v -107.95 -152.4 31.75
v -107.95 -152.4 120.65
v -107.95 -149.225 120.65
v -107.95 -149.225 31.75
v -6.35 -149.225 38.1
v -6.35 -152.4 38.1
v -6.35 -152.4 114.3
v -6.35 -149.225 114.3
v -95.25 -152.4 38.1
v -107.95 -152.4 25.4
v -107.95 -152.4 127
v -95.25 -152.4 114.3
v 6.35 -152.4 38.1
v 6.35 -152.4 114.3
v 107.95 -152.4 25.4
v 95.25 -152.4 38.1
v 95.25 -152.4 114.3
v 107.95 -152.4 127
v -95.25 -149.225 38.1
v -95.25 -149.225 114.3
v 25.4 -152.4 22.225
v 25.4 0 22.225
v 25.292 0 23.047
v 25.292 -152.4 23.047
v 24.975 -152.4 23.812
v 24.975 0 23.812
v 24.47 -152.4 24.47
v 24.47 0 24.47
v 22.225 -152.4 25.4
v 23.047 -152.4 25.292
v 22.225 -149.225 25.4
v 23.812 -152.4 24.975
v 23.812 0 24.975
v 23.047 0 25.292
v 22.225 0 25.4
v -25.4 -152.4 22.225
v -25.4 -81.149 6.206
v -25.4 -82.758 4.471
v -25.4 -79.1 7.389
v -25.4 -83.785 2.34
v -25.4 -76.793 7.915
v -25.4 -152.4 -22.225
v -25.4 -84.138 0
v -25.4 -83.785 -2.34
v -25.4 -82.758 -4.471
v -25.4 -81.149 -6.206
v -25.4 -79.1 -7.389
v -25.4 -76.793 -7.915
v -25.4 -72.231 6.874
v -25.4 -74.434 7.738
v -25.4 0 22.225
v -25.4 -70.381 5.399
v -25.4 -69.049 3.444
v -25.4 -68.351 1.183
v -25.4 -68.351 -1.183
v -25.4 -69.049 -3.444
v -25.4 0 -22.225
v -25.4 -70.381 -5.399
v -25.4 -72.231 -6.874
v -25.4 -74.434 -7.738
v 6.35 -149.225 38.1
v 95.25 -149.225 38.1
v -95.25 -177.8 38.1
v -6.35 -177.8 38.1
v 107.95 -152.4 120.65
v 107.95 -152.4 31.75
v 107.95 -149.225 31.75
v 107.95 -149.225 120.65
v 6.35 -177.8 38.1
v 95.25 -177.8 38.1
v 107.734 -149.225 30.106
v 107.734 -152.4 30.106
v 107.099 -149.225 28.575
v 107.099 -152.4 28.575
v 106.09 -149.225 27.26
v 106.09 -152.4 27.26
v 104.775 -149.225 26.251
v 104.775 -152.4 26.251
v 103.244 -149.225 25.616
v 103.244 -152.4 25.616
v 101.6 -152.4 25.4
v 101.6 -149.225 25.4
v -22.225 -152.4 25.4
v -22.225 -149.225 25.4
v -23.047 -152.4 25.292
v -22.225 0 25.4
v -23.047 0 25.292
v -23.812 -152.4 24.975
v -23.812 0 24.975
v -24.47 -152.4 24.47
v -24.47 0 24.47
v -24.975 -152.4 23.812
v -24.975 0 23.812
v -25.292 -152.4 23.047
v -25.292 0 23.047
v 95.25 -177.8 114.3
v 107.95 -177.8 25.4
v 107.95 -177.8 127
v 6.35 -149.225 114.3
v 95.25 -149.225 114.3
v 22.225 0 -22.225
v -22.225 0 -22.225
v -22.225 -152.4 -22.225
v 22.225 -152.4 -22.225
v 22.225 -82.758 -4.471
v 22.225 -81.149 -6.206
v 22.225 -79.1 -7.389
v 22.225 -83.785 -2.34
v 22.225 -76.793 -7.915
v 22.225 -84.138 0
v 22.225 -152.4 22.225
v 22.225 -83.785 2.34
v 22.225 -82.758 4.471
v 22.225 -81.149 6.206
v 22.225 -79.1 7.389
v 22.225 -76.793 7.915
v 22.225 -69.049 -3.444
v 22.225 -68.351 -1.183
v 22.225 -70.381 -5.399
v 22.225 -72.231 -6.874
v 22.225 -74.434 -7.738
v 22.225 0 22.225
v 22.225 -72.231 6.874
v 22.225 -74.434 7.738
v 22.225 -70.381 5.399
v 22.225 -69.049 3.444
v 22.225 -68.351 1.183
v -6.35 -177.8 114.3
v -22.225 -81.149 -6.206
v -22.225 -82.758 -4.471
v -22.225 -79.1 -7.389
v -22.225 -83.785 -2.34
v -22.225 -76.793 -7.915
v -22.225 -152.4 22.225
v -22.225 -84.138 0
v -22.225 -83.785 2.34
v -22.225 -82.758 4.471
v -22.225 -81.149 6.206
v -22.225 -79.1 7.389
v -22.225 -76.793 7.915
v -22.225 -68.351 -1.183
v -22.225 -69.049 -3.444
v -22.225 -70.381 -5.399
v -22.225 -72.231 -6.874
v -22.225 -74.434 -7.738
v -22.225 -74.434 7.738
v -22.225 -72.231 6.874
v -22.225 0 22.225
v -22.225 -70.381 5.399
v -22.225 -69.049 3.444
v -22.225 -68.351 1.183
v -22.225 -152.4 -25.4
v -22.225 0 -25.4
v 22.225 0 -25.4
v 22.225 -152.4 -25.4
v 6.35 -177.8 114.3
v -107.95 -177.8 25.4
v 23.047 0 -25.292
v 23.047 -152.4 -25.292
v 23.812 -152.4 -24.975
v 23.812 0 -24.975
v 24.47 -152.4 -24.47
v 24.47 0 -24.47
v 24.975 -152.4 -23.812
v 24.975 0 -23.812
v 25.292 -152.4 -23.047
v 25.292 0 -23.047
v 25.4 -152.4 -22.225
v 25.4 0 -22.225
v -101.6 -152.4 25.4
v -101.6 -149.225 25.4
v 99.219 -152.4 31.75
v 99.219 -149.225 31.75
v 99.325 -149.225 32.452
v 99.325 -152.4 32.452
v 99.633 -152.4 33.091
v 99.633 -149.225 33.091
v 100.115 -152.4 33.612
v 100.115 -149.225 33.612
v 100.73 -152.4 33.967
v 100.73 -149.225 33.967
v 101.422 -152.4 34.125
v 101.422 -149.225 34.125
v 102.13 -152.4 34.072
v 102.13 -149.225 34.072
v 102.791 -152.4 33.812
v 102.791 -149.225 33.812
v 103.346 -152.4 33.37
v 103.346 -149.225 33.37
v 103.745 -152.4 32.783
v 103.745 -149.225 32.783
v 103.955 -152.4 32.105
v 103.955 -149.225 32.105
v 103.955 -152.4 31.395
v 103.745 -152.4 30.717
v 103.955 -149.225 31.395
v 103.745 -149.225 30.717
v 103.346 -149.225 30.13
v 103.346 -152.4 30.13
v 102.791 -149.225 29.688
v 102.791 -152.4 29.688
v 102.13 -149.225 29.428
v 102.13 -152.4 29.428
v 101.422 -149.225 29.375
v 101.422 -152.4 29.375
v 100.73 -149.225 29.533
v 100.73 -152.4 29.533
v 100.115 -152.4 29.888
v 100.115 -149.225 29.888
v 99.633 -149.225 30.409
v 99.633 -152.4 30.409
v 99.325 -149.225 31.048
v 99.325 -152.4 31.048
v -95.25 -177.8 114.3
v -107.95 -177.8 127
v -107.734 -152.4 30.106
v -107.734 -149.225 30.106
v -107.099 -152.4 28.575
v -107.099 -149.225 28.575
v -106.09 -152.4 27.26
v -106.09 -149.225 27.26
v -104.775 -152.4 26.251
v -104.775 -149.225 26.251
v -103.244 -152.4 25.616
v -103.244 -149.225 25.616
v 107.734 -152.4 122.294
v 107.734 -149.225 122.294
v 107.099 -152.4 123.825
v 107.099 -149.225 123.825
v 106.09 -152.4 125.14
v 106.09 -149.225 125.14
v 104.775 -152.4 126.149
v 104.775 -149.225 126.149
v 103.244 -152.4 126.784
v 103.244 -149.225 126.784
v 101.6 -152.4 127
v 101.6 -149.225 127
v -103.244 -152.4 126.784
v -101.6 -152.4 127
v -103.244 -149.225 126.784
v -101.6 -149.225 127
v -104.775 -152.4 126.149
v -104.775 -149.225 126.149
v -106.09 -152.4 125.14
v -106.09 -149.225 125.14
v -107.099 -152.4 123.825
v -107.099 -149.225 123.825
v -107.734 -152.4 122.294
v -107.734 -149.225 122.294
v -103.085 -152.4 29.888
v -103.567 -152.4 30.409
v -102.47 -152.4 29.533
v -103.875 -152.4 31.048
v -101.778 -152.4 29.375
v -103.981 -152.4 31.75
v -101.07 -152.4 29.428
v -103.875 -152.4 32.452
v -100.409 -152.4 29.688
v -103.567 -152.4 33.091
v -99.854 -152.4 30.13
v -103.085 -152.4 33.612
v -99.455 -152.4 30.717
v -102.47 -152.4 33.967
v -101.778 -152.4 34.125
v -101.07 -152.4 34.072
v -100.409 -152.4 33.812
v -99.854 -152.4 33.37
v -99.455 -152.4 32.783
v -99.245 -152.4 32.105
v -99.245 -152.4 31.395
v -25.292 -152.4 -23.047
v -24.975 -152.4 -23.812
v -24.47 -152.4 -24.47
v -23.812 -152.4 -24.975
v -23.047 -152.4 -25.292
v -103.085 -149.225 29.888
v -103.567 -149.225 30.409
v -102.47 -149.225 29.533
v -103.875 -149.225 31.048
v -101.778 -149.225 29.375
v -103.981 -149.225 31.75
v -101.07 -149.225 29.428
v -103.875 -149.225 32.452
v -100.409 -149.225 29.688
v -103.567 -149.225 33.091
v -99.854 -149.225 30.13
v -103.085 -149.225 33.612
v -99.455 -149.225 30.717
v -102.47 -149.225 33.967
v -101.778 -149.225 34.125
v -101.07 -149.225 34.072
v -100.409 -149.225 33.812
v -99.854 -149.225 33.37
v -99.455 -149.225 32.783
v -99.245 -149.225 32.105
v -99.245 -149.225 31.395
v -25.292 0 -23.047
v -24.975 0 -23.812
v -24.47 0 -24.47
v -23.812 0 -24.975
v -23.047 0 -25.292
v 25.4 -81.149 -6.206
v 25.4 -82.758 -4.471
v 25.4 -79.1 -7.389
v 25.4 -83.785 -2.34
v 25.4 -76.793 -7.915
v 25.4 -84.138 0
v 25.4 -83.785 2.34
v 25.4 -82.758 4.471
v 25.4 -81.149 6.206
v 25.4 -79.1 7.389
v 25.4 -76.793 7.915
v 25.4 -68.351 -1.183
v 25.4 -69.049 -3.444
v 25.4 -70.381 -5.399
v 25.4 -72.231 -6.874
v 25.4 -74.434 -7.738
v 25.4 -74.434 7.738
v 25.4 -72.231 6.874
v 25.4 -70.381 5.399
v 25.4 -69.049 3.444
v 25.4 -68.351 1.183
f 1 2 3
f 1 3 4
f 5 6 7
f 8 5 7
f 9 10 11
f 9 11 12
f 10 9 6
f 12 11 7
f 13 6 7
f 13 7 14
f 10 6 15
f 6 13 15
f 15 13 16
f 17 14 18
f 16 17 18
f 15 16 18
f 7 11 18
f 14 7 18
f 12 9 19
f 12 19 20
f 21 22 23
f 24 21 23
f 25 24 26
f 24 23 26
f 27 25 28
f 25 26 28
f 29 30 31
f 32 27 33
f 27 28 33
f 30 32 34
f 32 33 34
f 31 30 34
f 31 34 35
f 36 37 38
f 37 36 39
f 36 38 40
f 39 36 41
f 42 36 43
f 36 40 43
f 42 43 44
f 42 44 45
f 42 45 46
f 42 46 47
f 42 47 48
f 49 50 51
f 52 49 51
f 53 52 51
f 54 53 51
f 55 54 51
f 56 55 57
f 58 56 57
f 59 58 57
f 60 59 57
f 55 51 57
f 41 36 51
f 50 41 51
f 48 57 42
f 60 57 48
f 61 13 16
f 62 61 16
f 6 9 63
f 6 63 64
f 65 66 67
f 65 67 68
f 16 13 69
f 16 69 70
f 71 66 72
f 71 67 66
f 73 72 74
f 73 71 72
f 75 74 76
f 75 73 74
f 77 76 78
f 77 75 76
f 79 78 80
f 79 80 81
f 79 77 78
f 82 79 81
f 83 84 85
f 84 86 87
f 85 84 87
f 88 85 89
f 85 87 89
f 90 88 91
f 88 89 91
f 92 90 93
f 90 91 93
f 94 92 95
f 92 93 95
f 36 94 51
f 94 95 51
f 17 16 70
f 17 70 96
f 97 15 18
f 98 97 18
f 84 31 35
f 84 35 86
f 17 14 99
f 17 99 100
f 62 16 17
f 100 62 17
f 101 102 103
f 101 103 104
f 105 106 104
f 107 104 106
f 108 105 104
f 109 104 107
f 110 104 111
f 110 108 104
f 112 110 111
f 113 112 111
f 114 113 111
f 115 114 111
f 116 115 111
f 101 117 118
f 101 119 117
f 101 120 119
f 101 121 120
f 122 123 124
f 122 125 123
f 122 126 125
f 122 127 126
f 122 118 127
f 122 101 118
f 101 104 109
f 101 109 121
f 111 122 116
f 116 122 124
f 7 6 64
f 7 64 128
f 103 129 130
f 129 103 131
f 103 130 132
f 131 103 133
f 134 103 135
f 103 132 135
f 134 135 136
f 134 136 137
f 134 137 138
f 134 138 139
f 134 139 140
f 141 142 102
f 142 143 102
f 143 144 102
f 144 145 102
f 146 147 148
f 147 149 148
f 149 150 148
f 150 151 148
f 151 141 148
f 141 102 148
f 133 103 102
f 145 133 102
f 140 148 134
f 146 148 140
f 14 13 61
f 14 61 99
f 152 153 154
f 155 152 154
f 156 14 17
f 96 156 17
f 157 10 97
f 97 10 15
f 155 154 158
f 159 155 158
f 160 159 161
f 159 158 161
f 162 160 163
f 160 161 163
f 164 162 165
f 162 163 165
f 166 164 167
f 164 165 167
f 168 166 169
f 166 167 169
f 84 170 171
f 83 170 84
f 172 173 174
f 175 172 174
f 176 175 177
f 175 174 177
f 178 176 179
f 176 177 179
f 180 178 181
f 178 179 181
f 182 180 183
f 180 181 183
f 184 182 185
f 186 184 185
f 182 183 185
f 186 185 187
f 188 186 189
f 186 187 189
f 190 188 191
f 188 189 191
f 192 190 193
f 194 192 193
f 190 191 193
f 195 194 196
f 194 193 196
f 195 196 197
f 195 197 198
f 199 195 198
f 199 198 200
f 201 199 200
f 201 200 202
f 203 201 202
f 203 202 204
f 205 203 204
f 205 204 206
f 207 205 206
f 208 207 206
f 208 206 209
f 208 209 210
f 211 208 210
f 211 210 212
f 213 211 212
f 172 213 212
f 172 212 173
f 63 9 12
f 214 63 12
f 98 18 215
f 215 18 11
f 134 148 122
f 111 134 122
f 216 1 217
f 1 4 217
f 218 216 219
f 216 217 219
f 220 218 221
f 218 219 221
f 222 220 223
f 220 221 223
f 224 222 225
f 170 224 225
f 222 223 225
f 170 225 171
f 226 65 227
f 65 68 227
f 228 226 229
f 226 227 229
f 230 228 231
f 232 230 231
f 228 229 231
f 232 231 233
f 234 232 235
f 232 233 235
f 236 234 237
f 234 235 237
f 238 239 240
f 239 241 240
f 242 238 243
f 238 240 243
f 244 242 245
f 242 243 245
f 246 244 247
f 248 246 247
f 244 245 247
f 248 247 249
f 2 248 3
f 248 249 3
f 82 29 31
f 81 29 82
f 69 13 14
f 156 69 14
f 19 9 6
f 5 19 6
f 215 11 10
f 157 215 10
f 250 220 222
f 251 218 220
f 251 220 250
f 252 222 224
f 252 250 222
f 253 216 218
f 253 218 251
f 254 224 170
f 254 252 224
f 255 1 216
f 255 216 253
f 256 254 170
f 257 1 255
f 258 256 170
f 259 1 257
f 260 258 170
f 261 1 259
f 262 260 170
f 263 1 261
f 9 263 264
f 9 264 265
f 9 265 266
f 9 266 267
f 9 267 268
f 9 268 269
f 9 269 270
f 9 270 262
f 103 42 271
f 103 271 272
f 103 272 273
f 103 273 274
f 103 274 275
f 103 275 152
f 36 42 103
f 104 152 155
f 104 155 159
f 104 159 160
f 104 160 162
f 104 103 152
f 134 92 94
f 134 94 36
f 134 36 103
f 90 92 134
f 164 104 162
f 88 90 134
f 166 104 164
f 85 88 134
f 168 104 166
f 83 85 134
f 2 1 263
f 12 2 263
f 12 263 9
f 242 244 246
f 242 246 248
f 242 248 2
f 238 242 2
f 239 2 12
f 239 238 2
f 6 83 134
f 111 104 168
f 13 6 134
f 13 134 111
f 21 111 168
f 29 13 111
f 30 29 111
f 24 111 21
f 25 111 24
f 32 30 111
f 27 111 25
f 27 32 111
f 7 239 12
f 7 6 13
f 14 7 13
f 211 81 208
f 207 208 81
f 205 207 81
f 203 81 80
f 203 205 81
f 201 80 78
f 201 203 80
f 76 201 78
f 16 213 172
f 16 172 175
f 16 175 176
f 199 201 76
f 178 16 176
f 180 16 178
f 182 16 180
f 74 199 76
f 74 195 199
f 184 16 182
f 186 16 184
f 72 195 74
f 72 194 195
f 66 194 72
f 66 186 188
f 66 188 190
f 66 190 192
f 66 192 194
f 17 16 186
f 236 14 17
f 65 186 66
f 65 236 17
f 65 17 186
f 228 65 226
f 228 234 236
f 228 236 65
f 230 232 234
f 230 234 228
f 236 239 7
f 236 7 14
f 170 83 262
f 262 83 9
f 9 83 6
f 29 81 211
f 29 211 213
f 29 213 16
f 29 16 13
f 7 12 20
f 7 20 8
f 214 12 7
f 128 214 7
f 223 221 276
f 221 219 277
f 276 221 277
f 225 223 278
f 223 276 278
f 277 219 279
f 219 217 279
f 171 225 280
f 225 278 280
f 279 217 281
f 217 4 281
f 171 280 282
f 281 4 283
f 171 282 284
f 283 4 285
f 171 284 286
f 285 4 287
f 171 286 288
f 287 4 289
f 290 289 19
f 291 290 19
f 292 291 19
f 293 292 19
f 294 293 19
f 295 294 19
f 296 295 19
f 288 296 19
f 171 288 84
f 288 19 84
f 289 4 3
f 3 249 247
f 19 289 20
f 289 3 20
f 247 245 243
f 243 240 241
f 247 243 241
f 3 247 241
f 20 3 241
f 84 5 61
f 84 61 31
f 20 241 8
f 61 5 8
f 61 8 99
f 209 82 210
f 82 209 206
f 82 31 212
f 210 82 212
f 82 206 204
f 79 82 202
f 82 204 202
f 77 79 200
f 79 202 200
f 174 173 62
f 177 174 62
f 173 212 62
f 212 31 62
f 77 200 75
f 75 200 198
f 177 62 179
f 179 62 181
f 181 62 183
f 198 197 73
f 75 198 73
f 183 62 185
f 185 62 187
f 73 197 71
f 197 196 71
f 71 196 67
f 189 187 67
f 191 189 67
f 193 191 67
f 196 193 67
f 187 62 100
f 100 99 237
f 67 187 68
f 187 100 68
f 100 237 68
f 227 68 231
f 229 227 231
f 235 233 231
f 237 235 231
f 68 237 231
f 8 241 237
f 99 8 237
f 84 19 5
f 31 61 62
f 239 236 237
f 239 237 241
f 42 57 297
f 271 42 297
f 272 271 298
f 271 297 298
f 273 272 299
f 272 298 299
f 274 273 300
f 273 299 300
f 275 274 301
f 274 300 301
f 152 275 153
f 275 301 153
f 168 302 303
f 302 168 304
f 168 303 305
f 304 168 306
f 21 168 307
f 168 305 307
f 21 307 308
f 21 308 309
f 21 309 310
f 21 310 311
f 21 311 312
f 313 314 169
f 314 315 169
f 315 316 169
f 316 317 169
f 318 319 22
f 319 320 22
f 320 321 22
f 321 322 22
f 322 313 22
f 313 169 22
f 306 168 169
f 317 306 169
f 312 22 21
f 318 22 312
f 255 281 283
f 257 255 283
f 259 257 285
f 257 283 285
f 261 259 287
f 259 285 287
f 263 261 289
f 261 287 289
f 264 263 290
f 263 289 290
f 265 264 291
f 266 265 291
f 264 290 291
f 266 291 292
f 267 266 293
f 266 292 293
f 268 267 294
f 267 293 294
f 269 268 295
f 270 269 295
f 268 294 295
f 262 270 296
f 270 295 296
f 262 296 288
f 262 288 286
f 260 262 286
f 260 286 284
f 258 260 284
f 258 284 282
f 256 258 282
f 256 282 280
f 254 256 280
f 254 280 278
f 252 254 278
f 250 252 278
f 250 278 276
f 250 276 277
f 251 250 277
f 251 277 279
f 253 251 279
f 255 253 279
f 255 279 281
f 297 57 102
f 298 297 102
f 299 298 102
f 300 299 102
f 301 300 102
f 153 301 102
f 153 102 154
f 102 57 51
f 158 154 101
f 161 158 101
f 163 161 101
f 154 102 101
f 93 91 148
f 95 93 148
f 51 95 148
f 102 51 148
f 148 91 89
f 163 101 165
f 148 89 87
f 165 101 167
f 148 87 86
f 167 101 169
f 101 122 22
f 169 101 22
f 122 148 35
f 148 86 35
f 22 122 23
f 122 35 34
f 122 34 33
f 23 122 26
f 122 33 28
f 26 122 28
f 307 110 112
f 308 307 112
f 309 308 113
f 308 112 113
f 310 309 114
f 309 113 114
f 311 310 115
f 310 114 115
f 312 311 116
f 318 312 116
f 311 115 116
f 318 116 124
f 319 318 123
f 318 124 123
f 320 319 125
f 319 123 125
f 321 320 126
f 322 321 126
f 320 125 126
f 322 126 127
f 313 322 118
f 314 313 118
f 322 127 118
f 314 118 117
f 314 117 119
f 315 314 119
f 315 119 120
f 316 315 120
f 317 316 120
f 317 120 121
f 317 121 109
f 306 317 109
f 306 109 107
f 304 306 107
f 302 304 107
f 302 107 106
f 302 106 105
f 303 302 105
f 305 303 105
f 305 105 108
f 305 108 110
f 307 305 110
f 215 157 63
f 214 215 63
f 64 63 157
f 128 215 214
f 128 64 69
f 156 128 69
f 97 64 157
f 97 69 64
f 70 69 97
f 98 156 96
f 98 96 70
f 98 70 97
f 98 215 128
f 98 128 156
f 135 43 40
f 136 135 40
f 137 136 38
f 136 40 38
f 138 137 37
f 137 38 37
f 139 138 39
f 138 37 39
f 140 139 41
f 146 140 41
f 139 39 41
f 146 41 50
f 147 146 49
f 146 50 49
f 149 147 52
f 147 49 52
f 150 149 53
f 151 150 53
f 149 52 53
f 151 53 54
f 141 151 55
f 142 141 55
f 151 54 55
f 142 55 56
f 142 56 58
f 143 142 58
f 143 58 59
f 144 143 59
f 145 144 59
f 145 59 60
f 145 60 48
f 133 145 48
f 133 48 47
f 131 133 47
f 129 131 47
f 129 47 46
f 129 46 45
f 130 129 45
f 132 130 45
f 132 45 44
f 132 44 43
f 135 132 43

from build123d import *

# Parameters (mm, degrees)
F0_W     = 44.45
F0_H     = 44.45
F1_DEPTH = 152.4
F3_D     = 15.875
F4_W     = 88.9
F4_H     = 76.2
F5_DEPTH = 3.175
F6_D     = 4.7625
F7_R     = 6.35
F8_DEPTH = 25.4


with BuildPart() as f1:
    # F0 (on Front) → F1 (new body)
    with BuildSketch(Plane.XZ):
        with BuildLine():
            ThreePointArc((25.4, 22.225), (24.470064, 24.470064), (22.225, 25.4))
            Line((22.225, 25.4), (-22.225, 25.4))
            ThreePointArc((-22.225, 25.4), (-24.470064, 24.470064), (-25.4, 22.225))
            Line((-25.4, 22.225), (-25.4, -22.225))
            ThreePointArc((-25.4, -22.225), (-24.470064, -24.470064), (-22.225, -25.4))
            Line((-22.225, -25.4), (22.225, -25.4))
            ThreePointArc((22.225, -25.4), (24.470064, -24.470064), (25.4, -22.225))
            Line((25.4, -22.225), (25.4, 22.225))
        make_face()
        Rectangle(F0_W, F0_H, mode=Mode.SUBTRACT)
    extrude(amount=F1_DEPTH)

    # F3 (through all)
    with Locations(Plane.YZ.offset(25.4)):
        with Locations((-76.2, 0)):
            Hole(F3_D / 2)

    # F4 (on face) → F5 (join)
    with BuildSketch(Plane.XZ.offset(152.4)):
        Polygon((-22.225, 25.4), (0, 25.4), (22.225, 25.4), (107.95, 25.4), (107.95, 127), (-107.95, 127), (-107.95, 25.4), align=None)
        with Locations((-50.8, 76.2)):
            Rectangle(F4_W, F4_H, mode=Mode.SUBTRACT)
        with Locations((50.8, 76.2)):
            Rectangle(F4_W, F4_H, mode=Mode.SUBTRACT)
    extrude(amount=-F5_DEPTH)

    # F6 (through all)
    with Locations(Plane.XZ.offset(152.4)):
        with Locations((-101.6, 31.75), (101.6, 31.75)):
            Hole(F6_D / 2)

    # F7
    f7_edges = [f1.edges().sort_by_distance(p)[0] for p in [
        (107.95, -150.8125, 25.4),
        (107.95, -150.8125, 127),
        (-107.95, -150.8125, 127),
        (-107.95, -150.8125, 25.4),
    ]]
    fillet(f7_edges, radius=F7_R)


with BuildPart() as f8:
    # F4 (on face) → F8 (new body)
    with BuildSketch(Plane.XZ.offset(152.4)):
        Polygon((-22.225, 25.4), (0, 25.4), (22.225, 25.4), (107.95, 25.4), (107.95, 127), (-107.95, 127), (-107.95, 25.4), align=None)
        with Locations((-50.8, 76.2)):
            Rectangle(F4_W, F4_H, mode=Mode.SUBTRACT)
        with Locations((50.8, 76.2)):
            Rectangle(F4_W, F4_H, mode=Mode.SUBTRACT)
    extrude(amount=F8_DEPTH)


solid = Compound([f1.part, f8.part])
